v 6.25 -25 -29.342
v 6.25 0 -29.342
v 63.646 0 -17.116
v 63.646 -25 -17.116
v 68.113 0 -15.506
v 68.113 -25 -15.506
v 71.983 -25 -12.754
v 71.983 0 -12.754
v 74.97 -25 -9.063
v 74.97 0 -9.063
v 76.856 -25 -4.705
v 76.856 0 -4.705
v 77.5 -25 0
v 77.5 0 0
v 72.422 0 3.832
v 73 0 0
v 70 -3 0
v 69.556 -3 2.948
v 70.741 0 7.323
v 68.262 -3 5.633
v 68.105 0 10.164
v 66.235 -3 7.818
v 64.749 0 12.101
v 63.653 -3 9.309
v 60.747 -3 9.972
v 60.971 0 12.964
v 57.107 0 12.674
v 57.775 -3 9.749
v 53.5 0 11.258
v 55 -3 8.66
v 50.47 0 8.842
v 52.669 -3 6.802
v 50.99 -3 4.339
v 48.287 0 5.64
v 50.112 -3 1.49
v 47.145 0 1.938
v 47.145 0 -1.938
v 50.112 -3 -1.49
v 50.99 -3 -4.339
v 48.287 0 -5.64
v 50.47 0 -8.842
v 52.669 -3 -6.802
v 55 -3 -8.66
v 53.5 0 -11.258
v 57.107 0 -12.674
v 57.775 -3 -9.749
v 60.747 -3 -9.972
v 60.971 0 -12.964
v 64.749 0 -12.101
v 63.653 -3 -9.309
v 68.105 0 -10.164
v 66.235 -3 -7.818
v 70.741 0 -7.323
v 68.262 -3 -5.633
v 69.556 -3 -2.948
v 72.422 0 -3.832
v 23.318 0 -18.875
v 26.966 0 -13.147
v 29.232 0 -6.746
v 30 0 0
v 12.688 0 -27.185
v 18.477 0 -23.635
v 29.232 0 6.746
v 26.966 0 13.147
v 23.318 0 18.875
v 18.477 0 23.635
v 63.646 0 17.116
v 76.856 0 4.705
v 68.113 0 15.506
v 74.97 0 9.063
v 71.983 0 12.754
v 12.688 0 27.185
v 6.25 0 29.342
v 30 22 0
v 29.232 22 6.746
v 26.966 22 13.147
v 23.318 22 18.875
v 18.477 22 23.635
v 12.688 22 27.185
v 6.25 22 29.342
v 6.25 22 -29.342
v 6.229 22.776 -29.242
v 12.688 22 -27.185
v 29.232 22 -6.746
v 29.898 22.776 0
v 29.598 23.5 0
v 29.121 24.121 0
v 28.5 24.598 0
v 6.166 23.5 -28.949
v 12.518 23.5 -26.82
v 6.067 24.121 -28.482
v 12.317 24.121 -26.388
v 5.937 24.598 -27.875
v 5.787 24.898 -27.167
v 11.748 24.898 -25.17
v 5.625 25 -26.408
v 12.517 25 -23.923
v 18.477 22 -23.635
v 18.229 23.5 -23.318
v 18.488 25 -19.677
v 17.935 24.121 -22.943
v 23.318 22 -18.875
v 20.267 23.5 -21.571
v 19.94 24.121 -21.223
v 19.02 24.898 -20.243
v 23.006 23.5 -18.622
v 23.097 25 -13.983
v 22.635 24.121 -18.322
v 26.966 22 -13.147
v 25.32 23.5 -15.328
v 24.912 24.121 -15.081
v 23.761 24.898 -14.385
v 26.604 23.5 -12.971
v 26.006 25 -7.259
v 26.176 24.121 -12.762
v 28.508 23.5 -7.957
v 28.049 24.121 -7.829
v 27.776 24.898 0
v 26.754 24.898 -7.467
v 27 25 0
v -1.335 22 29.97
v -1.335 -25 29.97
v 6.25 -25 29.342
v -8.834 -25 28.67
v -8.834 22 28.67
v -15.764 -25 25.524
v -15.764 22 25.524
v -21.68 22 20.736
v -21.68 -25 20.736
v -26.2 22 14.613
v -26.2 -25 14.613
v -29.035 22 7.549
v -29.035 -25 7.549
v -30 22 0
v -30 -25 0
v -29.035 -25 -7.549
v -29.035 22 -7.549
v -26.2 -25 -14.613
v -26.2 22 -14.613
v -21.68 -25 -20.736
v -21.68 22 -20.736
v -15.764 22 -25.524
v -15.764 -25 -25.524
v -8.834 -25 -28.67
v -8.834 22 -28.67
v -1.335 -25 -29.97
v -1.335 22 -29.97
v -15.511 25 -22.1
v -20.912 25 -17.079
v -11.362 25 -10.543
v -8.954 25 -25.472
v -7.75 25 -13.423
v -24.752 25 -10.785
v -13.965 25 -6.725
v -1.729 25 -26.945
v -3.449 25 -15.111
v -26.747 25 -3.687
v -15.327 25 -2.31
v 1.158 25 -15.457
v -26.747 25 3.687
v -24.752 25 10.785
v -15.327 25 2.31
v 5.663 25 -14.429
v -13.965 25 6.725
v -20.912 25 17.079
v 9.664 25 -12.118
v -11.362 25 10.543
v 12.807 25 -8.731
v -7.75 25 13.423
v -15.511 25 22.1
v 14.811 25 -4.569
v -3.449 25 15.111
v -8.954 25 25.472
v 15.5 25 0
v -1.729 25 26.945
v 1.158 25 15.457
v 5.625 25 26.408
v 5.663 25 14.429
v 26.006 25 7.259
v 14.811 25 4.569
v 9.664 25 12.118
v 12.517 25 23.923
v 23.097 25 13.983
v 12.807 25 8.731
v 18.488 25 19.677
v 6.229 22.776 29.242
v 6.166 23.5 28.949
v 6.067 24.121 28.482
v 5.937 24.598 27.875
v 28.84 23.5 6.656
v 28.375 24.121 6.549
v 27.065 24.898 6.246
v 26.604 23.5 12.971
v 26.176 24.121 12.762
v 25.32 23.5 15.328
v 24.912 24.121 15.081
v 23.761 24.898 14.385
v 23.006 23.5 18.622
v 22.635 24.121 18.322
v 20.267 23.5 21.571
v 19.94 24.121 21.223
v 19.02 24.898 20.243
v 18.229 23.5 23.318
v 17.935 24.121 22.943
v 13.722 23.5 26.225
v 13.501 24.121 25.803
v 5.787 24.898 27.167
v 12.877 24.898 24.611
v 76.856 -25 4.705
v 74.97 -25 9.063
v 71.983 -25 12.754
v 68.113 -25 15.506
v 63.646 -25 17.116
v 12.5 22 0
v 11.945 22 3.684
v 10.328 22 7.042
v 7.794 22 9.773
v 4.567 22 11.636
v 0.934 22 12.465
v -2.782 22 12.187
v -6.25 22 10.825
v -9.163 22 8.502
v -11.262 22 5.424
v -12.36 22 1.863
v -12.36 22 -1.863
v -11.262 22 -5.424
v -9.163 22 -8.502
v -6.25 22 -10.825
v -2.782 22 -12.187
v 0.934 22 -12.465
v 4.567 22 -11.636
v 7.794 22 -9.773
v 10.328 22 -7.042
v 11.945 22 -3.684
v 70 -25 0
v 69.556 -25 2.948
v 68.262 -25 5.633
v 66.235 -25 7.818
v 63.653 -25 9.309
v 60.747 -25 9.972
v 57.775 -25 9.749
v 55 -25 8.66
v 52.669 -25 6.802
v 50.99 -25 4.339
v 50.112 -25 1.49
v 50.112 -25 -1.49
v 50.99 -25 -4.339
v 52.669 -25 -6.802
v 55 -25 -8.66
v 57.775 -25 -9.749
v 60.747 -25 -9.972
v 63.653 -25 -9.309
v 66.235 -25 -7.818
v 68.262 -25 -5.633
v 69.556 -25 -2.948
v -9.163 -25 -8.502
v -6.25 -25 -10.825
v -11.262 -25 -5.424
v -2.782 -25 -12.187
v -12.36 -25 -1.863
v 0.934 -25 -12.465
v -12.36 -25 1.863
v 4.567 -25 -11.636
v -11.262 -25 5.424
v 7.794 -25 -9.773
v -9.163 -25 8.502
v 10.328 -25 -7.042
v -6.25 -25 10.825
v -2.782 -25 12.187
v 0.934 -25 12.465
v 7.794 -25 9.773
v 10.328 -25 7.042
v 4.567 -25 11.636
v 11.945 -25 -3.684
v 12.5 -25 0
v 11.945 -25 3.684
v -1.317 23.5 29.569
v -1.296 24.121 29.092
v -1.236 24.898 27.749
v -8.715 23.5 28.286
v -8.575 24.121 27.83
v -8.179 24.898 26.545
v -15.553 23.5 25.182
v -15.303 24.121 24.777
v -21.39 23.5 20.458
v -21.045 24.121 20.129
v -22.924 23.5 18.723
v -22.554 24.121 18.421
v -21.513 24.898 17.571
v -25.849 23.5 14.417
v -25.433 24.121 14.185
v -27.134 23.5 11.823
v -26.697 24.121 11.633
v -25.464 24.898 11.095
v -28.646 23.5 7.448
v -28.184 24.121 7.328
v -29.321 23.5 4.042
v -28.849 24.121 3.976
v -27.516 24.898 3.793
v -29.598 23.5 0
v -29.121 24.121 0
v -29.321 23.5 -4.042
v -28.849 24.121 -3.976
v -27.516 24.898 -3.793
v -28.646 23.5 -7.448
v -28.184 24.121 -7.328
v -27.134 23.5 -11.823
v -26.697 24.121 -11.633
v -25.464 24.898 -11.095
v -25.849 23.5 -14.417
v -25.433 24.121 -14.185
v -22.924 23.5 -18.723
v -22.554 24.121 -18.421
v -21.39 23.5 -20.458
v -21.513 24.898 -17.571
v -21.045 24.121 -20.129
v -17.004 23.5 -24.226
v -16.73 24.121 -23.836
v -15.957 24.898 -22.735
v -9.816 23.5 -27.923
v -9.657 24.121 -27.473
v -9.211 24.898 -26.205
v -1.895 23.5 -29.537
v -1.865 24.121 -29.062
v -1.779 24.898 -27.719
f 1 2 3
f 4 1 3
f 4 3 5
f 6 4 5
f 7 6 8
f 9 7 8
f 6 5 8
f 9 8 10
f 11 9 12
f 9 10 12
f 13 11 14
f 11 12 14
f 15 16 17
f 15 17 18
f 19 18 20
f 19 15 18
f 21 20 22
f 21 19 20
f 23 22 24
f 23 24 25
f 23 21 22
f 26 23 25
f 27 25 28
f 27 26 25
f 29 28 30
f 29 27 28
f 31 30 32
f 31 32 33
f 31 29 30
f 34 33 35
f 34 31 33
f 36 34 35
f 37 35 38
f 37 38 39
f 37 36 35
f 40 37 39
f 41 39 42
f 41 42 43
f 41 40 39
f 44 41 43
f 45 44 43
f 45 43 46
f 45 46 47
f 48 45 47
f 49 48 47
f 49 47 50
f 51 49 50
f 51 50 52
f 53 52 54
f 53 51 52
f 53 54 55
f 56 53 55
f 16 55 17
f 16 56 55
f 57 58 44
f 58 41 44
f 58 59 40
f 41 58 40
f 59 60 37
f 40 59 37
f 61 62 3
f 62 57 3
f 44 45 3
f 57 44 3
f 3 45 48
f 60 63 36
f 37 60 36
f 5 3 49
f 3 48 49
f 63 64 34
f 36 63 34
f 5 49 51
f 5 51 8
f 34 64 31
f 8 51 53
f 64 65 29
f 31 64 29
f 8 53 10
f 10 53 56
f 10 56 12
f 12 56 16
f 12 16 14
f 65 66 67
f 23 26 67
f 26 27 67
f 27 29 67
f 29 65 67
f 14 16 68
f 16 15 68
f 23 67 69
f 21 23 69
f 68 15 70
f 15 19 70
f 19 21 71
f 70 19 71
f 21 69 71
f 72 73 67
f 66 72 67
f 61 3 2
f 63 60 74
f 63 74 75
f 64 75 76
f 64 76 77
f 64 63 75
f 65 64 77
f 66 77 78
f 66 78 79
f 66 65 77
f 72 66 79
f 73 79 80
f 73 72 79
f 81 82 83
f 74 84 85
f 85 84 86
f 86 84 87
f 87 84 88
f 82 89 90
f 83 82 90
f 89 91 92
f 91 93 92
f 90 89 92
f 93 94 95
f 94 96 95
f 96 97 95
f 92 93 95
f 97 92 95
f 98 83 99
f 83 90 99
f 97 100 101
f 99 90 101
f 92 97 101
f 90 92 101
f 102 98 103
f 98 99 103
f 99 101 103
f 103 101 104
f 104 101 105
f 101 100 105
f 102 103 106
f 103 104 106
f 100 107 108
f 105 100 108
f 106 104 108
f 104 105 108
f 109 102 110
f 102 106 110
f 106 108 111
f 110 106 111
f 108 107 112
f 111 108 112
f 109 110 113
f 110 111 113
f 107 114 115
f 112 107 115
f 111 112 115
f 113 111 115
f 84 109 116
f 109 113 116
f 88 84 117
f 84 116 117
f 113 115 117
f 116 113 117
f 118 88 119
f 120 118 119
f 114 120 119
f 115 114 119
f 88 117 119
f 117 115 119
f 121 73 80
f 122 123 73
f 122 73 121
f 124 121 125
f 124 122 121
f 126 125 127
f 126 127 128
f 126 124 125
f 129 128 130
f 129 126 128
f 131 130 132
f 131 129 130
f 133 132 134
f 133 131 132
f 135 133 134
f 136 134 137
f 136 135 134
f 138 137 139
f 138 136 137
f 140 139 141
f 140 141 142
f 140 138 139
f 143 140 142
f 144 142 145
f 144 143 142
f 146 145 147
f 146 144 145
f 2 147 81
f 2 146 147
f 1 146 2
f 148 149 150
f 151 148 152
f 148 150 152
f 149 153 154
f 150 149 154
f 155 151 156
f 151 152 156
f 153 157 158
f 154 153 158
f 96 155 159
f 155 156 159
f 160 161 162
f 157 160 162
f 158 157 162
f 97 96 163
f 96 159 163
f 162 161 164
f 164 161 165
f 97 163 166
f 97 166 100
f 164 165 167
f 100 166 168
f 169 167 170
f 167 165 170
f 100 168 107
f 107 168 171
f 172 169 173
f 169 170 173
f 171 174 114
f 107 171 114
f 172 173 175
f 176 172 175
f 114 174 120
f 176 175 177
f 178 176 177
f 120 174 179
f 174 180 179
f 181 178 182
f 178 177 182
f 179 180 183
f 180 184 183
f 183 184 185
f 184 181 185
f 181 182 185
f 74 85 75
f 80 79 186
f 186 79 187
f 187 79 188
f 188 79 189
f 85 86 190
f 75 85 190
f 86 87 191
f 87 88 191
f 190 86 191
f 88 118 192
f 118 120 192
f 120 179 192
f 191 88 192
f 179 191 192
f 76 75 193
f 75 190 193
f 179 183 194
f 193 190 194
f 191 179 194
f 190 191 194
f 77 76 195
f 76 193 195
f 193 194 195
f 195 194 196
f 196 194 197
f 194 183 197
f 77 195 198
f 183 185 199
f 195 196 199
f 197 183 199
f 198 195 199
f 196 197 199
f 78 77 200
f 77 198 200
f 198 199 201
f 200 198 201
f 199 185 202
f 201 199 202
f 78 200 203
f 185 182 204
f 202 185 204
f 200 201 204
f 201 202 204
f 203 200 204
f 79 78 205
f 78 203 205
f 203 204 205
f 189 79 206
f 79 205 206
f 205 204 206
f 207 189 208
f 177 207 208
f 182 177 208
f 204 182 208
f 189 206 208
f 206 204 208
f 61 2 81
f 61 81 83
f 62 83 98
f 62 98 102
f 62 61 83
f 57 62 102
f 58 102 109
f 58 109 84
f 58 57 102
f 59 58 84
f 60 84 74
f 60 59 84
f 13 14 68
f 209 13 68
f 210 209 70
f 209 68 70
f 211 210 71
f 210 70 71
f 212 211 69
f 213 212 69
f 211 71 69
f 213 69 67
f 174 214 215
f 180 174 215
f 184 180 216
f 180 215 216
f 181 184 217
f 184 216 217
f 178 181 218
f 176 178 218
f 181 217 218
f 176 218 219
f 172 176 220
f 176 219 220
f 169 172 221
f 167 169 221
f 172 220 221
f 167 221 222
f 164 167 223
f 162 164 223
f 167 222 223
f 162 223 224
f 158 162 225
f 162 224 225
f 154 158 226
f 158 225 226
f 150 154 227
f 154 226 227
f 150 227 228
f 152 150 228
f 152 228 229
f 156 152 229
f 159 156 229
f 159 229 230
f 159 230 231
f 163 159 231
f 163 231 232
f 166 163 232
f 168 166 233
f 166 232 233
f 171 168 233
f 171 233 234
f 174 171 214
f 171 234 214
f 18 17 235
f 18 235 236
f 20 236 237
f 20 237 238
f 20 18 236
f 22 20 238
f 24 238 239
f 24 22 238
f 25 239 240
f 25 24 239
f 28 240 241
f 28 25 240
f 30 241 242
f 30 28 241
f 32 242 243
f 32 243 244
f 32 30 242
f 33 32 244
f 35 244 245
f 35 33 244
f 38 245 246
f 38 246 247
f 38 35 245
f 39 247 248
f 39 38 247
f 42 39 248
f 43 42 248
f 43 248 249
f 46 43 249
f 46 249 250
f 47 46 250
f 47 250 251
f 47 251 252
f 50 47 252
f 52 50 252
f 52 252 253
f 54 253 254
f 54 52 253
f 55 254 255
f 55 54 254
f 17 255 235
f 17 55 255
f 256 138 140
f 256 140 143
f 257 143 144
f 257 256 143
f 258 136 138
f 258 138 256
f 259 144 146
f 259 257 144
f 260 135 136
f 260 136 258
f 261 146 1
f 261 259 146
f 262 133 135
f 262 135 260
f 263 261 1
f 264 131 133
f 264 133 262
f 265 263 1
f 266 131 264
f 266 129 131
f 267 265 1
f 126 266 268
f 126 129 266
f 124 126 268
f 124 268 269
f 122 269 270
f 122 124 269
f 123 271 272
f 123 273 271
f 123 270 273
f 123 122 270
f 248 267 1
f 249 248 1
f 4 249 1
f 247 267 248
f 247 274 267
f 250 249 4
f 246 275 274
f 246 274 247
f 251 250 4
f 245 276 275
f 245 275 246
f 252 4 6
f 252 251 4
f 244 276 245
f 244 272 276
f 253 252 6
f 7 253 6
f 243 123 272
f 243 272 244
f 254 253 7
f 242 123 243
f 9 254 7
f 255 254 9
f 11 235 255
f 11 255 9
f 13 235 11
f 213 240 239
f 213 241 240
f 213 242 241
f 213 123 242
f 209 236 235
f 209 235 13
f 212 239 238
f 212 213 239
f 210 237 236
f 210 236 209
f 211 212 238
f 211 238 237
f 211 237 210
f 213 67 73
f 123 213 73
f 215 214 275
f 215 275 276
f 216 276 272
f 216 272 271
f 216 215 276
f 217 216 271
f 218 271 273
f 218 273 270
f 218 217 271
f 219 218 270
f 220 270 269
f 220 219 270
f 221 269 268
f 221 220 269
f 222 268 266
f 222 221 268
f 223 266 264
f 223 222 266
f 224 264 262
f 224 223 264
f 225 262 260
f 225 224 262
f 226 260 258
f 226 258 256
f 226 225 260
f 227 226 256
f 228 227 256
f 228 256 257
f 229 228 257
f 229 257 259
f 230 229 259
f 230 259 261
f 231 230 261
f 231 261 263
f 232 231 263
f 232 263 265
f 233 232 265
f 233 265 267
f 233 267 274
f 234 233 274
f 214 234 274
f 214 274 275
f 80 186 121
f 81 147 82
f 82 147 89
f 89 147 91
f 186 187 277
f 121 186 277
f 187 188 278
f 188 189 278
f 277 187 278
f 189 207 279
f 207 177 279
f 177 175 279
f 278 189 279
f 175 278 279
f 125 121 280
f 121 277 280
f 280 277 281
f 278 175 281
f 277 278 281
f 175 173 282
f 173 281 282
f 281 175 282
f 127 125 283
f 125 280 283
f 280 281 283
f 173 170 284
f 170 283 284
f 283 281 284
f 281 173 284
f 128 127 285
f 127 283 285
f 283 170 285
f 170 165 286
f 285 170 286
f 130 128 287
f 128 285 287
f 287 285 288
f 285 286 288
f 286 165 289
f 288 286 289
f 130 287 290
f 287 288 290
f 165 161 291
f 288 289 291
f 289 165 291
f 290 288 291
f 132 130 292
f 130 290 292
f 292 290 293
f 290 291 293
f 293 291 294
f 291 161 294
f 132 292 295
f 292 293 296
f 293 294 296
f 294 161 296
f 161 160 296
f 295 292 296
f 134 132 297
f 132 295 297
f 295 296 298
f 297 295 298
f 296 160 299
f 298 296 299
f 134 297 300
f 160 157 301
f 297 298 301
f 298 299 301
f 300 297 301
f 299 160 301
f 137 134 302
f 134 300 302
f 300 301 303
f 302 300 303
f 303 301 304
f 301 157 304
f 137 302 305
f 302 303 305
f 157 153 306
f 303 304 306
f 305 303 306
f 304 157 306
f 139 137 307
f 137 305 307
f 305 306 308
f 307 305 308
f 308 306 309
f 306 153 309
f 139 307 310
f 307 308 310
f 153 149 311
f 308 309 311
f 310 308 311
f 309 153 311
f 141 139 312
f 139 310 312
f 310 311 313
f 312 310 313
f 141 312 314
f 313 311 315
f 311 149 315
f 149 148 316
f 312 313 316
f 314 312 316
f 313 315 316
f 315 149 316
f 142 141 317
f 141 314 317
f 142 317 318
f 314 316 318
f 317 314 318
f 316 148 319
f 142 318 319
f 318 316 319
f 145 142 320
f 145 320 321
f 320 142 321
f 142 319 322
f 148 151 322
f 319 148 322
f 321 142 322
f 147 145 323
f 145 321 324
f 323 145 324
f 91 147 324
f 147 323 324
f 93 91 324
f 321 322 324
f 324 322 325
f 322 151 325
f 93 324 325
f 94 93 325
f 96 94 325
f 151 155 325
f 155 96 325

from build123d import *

# Parameters (mm, degrees)
F0_R     = 12.5
F0_R_2   = 10
F1_DEPTH = 25
F2_DEPTH = 25
F3_R     = 3
F4_SIZE  = 3


with BuildPart() as f1:
    # F0 (on Front) → F1 (new body)
    with BuildSketch(Plane.XZ):
        with BuildLine():
            ThreePointArc((6.25, -29.341736), (23.318448, -18.874586), (30, 0))
            ThreePointArc((30, 0), (23.318448, 18.874586), (6.25, 29.341736))
            ThreePointArc((6.25, 29.341736), (-30, 0), (6.25, -29.341736))
        make_face()
        Circle(F0_R, mode=Mode.SUBTRACT)
        with BuildLine():
            ThreePointArc((6.25, 29.341736), (23.318448, 18.874586), (30, 0))
            ThreePointArc((30, 0), (23.318448, -18.874586), (6.25, -29.341736))
            Line((6.25, -29.341736), (63.645833, -17.116013))
            ThreePointArc((63.645833, -17.116013), (42.5, 0), (63.645833, 17.116013))
            Line((63.645833, 17.116013), (6.25, 29.341736))
        make_face()
        with BuildLine():
            ThreePointArc((77.5, 0), (73.602428, 11.010175), (63.645833, 17.116013))
            ThreePointArc((63.645833, 17.116013), (42.5, 0), (63.645833, -17.116013))
            ThreePointArc((63.645833, -17.116013), (73.602428, -11.010175), (77.5, 0))
        make_face()
        with Locations((60, 0)):
            Circle(F0_R_2, mode=Mode.SUBTRACT)
    extrude(amount=F1_DEPTH)

    # F0 (on Front) → F2 (join)
    with BuildSketch(Plane.XZ):
        with BuildLine():
            ThreePointArc((6.25, -29.341736), (23.318448, -18.874586), (30, 0))
            ThreePointArc((30, 0), (23.318448, 18.874586), (6.25, 29.341736))
            ThreePointArc((6.25, 29.341736), (-30, 0), (6.25, -29.341736))
        make_face()
        Circle(F0_R, mode=Mode.SUBTRACT)
    extrude(amount=-F2_DEPTH)

    # F3
    f3_edges = [f1.edges().sort_by_distance(p)[0] for p in [
        (-6.25, 25, 29.341736),
    ]]
    fillet(f3_edges, radius=F3_R)

    # F4
    f4_edges = [f1.edges().sort_by_distance(p)[0] for p in [
        (-12.5, 25, 0),
        (50, 0, 0),
    ]]
    chamfer(f4_edges, length=F4_SIZE)


solid = f1.part
